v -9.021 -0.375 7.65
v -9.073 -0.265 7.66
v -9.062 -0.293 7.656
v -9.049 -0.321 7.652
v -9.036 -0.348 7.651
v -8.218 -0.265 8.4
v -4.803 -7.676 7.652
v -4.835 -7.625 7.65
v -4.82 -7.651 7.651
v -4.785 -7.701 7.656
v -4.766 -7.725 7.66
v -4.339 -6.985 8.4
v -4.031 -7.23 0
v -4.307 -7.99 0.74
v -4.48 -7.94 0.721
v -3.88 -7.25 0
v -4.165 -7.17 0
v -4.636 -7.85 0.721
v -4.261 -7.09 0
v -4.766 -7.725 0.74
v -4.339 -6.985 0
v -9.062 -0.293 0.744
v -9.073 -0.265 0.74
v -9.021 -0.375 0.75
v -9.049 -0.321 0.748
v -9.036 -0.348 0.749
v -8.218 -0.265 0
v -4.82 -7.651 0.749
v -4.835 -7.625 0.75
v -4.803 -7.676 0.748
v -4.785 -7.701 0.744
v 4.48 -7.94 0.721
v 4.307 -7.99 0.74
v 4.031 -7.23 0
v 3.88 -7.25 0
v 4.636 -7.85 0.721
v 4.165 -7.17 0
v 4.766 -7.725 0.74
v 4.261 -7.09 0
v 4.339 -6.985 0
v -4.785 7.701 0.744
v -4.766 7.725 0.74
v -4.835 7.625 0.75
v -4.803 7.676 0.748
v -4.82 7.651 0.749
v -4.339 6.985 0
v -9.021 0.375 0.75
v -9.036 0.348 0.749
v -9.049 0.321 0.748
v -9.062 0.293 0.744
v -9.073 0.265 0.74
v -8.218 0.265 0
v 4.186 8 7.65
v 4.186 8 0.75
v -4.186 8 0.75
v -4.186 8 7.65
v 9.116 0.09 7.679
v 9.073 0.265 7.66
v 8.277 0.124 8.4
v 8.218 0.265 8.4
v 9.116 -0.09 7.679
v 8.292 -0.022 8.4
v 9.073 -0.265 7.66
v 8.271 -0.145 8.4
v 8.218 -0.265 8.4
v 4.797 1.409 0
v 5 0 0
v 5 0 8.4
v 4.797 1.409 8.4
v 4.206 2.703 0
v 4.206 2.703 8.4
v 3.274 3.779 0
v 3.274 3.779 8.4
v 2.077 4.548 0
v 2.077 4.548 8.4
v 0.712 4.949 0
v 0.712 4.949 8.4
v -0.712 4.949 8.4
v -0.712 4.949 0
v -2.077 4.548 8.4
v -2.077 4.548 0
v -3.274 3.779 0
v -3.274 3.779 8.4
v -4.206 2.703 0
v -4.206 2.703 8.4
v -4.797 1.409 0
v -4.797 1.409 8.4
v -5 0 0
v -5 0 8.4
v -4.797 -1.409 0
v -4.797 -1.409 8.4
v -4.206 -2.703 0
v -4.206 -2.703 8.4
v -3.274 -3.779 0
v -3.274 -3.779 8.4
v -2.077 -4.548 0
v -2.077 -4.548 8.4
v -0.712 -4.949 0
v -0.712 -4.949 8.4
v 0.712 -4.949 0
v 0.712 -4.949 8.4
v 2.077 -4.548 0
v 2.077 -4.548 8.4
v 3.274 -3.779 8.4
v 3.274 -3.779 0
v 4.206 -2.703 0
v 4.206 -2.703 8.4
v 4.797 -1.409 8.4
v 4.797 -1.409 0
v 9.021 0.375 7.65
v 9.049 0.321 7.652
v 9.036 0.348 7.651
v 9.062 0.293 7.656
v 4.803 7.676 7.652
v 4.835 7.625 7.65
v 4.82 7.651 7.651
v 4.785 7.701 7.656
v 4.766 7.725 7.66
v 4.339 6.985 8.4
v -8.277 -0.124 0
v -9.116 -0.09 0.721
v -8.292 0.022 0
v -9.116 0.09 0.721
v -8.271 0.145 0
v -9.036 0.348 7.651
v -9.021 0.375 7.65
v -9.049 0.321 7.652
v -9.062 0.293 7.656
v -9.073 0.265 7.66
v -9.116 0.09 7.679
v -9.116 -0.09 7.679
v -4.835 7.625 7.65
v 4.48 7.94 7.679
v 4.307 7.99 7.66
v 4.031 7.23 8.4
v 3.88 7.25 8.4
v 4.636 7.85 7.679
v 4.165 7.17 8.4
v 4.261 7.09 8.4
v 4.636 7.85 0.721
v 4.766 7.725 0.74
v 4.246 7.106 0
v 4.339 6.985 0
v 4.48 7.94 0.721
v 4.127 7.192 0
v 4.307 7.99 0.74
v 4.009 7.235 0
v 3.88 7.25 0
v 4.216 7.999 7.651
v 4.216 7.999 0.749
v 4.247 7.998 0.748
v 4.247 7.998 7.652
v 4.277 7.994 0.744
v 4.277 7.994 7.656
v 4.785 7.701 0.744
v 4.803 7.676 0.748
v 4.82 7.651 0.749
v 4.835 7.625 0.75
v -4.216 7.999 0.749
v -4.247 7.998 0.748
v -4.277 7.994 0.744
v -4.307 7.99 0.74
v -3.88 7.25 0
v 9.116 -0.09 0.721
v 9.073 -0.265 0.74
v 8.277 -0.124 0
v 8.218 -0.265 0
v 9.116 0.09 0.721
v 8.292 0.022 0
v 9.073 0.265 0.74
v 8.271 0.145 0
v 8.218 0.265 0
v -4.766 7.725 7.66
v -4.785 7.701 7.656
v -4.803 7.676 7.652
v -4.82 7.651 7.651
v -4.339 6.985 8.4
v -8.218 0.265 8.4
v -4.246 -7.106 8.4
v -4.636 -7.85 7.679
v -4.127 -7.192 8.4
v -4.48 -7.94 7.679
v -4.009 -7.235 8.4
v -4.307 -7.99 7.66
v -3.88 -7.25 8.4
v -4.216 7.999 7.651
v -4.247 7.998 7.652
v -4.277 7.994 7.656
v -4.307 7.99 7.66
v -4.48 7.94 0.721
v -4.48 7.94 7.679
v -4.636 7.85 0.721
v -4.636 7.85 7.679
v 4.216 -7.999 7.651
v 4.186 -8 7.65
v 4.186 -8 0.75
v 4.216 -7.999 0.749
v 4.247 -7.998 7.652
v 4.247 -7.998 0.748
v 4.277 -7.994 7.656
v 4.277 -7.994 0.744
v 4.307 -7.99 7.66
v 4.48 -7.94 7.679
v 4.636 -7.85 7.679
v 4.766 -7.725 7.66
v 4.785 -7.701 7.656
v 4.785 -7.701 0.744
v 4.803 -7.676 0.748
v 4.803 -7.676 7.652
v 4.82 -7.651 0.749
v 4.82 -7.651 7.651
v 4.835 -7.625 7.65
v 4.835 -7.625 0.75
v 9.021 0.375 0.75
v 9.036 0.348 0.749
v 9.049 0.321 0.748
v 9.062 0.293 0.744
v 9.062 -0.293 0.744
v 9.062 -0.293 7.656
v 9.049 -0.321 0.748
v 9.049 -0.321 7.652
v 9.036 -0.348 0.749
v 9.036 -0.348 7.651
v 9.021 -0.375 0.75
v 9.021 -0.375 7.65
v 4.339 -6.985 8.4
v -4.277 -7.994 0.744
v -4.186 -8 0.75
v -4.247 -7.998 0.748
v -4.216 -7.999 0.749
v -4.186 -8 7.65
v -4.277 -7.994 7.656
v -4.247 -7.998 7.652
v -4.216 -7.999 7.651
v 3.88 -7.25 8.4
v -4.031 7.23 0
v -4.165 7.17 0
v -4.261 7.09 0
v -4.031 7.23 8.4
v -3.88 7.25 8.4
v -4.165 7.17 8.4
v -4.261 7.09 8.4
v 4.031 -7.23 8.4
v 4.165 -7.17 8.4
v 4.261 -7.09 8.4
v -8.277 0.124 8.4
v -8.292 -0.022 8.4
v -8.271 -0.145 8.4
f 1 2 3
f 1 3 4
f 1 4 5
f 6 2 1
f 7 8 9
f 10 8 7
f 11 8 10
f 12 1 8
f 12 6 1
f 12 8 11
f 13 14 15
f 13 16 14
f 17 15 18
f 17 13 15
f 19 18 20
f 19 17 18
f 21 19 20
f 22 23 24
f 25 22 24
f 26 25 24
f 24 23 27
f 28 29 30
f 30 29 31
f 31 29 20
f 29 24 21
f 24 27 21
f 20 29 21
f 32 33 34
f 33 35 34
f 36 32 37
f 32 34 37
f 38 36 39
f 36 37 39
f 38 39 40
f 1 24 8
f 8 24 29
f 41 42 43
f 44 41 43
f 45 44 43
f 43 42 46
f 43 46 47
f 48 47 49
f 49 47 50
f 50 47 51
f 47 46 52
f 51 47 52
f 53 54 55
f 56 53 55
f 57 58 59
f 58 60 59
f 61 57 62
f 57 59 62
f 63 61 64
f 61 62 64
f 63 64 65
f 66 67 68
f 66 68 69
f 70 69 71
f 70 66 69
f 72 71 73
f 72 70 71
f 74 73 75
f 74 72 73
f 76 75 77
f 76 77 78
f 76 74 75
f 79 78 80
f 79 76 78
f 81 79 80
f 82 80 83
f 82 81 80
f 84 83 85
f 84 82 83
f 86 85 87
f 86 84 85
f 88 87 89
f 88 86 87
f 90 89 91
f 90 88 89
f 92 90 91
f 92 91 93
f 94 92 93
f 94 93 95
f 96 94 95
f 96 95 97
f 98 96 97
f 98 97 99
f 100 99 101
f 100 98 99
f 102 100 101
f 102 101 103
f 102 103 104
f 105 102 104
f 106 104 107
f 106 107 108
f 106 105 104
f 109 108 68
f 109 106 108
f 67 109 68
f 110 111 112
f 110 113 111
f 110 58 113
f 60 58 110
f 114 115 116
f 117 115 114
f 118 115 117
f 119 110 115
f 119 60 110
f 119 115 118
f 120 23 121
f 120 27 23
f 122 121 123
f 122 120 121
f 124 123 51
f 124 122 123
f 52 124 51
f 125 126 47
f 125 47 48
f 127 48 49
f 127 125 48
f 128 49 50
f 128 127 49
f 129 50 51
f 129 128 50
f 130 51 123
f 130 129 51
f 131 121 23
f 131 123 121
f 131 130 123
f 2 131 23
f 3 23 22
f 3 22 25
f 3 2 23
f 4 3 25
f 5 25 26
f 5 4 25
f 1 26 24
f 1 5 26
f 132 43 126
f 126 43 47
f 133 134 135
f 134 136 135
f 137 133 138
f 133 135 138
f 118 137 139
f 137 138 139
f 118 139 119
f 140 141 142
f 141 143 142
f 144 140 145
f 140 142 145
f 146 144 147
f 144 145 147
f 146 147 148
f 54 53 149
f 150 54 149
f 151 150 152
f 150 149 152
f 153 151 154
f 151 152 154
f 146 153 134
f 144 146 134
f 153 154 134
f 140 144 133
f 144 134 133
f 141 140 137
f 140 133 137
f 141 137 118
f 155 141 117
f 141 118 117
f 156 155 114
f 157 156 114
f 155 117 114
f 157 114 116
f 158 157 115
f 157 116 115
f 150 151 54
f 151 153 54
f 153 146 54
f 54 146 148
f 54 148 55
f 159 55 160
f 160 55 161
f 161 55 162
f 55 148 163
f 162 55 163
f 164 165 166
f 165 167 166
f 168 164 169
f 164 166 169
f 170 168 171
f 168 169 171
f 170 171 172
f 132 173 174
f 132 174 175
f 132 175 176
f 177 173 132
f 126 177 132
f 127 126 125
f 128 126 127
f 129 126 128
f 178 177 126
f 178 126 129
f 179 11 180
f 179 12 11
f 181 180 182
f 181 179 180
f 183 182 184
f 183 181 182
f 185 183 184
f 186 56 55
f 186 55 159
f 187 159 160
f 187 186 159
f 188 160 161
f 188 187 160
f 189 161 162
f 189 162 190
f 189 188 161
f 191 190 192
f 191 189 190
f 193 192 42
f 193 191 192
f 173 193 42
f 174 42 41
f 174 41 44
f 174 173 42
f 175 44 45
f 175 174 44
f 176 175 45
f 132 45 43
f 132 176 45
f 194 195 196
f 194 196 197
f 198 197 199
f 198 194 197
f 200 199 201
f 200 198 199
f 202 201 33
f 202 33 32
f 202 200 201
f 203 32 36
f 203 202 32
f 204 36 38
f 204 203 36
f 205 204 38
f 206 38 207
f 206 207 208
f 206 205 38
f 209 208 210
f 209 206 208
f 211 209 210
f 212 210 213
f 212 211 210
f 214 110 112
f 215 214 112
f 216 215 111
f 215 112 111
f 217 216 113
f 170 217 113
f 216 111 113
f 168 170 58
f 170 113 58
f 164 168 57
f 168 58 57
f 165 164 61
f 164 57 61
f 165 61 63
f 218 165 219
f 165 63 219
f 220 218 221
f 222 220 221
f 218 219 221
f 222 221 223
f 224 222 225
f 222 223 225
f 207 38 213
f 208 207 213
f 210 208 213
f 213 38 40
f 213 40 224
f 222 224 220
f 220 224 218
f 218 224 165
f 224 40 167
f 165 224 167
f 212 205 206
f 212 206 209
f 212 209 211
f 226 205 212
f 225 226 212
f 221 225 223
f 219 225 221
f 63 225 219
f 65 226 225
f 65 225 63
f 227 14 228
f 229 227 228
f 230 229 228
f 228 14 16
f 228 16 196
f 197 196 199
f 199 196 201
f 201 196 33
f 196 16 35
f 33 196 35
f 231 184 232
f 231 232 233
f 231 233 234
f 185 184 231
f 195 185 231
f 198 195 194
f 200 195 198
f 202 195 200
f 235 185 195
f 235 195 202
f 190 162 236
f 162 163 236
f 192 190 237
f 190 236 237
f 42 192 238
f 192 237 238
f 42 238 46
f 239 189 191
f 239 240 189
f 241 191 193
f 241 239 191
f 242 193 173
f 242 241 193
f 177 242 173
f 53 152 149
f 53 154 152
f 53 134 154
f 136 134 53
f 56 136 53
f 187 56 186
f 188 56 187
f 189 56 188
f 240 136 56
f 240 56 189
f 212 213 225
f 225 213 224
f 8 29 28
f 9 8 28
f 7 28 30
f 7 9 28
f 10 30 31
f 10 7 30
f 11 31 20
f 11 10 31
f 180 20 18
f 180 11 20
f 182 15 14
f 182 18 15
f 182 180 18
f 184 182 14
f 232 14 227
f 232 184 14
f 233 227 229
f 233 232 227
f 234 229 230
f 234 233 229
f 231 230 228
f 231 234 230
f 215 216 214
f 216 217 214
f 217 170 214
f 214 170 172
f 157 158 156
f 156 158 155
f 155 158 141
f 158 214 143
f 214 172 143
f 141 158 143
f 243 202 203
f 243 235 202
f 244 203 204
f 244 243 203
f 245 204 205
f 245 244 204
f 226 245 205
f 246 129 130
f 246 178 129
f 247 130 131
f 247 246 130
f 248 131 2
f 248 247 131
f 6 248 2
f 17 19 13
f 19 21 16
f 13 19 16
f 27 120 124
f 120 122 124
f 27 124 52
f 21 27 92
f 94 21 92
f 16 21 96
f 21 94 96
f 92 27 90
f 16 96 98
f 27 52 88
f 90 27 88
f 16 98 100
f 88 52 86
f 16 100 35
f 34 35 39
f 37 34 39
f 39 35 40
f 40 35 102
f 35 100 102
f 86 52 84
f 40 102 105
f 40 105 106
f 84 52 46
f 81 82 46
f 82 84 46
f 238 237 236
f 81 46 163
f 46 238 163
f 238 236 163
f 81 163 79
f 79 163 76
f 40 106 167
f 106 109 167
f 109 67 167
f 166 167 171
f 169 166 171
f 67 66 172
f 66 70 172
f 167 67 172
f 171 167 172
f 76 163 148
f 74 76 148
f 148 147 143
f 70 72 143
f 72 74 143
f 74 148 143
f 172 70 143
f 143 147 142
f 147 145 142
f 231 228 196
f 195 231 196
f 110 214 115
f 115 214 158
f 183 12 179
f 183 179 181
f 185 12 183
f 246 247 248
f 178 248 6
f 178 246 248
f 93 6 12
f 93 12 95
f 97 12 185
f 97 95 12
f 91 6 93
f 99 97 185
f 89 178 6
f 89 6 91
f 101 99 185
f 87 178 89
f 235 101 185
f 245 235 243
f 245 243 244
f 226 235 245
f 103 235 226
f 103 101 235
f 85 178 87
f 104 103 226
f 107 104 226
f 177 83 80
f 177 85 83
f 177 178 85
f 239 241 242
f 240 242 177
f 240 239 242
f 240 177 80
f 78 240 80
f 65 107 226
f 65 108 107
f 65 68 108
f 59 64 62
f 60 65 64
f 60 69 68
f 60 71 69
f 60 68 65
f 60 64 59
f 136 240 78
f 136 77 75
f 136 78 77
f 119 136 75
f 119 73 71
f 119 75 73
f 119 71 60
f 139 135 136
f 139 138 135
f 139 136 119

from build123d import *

# Parameters (mm, degrees)
F0_R     = 5
F1_DEPTH = 8.4
F2_SIZE  = 0.75
F3_F1_R  = 0.75
F3_F2_R  = 0.75
F3_F3_R  = 0.75
F3_F4_R  = 0.75
F3_F5_R  = 0.75
F3_F6_R  = 0.75
F3_F7_R  = 0.75
F3_F8_R  = 0.75
F3_F9_R  = 0.75
F3_F10_R = 0.75
F3_F11_R = 0.75
F3_F12_R = 0.75
F3_F13_R = 0.75
F3_F14_R = 0.75
F3_F15_R = 0.75
F3_F16_R = 0.75
F3_F17_R = 0.75
F3_F18_R = 0.75


with BuildPart() as f1:
    # F0 (on Top) → F1 (new body)
    with BuildSketch(Plane.XY):
        Polygon((4.6188021535, 8), (-4.6188021535, 8), (-9.237604307, 0), (-4.6188021535, -8), (4.6188021535, -8), (9.237604307, 0), align=None)
        Circle(F0_R, mode=Mode.SUBTRACT)
    extrude(amount=F1_DEPTH)

    # F2
    f2_edges = [f1.edges().sort_by_distance(p)[0] for p in [
        (0, -8, 8.4),
        (-6.928203, -4, 8.4),
        (-6.928203, 4, 8.4),
        (0, 8, 8.4),
        (6.928203, 4, 8.4),
        (6.928203, -4, 8.4),
        (6.928203, -4, 0),
        (0, -8, 0),
        (-6.928203, -4, 0),
        (-6.928203, 4, 0),
        (0, 8, 0),
        (6.928203, 4, 0),
    ]]
    chamfer(f2_edges, length=F2_SIZE)

    # F3: fillet of radius 0.75 on 18 edges, made by hand

    # F3_f1
    f3_f1_edges = [f1.edges().sort_by_distance(p)[0] for p in [
        (4.6188021535, 8, 4.2),
    ]]
    fillet(f3_f1_edges, radius=F3_F1_R)

    # F3_f2
    f3_f2_edges = [f1.edges().sort_by_distance(p)[0] for p in [
        (-4.6188021535, 8, 4.2),
    ]]
    fillet(f3_f2_edges, radius=F3_F2_R)

    # F3_f3
    f3_f3_edges = [f1.edges().sort_by_distance(p)[0] for p in [
        (9.237604307, 0, 4.2),
    ]]
    fillet(f3_f3_edges, radius=F3_F3_R)

    # F3_f4
    f3_f4_edges = [f1.edges().sort_by_distance(p)[0] for p in [
        (4.3732894516, 7.5747595264, 0.3247595264),
    ]]
    fillet(f3_f4_edges, radius=F3_F4_R)

    # F3_f5
    f3_f5_edges = [f1.edges().sort_by_distance(p)[0] for p in [
        (-4.3732894516, 7.5747595264, 0.3247595264),
    ]]
    fillet(f3_f5_edges, radius=F3_F5_R)

    # F3_f6
    f3_f6_edges = [f1.edges().sort_by_distance(p)[0] for p in [
        (4.3732894516, 7.5747595264, 8.0752404736),
    ]]
    fillet(f3_f6_edges, radius=F3_F6_R)

    # F3_f7
    f3_f7_edges = [f1.edges().sort_by_distance(p)[0] for p in [
        (-4.3732894516, 7.5747595264, 8.0752404736),
    ]]
    fillet(f3_f7_edges, radius=F3_F7_R)

    # F3_f8
    f3_f8_edges = [f1.edges().sort_by_distance(p)[0] for p in [
        (-9.237604307, 0, 4.2),
    ]]
    fillet(f3_f8_edges, radius=F3_F8_R)

    # F3_f9
    f3_f9_edges = [f1.edges().sort_by_distance(p)[0] for p in [
        (4.6188021535, -8, 4.2),
    ]]
    fillet(f3_f9_edges, radius=F3_F9_R)

    # F3_f10
    f3_f10_edges = [f1.edges().sort_by_distance(p)[0] for p in [
        (8.7465789032, 0, 0.3247595264),
    ]]
    fillet(f3_f10_edges, radius=F3_F10_R)

    # F3_f11
    f3_f11_edges = [f1.edges().sort_by_distance(p)[0] for p in [
        (8.7465789032, 0, 8.0752404736),
    ]]
    fillet(f3_f11_edges, radius=F3_F11_R)

    # F3_f12
    f3_f12_edges = [f1.edges().sort_by_distance(p)[0] for p in [
        (-8.7465789032, 0, 0.3247595264),
    ]]
    fillet(f3_f12_edges, radius=F3_F12_R)

    # F3_f13
    f3_f13_edges = [f1.edges().sort_by_distance(p)[0] for p in [
        (-8.7465789032, 0, 8.0752404736),
    ]]
    fillet(f3_f13_edges, radius=F3_F13_R)

    # F3_f14
    f3_f14_edges = [f1.edges().sort_by_distance(p)[0] for p in [
        (-4.6188021535, -8, 4.2),
    ]]
    fillet(f3_f14_edges, radius=F3_F14_R)

    # F3_f15
    f3_f15_edges = [f1.edges().sort_by_distance(p)[0] for p in [
        (4.3732894516, -7.5747595264, 0.3247595264),
    ]]
    fillet(f3_f15_edges, radius=F3_F15_R)

    # F3_f16
    f3_f16_edges = [f1.edges().sort_by_distance(p)[0] for p in [
        (4.3732894516, -7.5747595264, 8.0752404736),
    ]]
    fillet(f3_f16_edges, radius=F3_F16_R)

    # F3_f17
    f3_f17_edges = [f1.edges().sort_by_distance(p)[0] for p in [
        (-4.3732894516, -7.5747595264, 0.3247595264),
    ]]
    fillet(f3_f17_edges, radius=F3_F17_R)

    # F3_f18
    f3_f18_edges = [f1.edges().sort_by_distance(p)[0] for p in [
        (-4.3732894516, -7.5747595264, 8.0752404736),
    ]]
    fillet(f3_f18_edges, radius=F3_F18_R)


solid = f1.part
